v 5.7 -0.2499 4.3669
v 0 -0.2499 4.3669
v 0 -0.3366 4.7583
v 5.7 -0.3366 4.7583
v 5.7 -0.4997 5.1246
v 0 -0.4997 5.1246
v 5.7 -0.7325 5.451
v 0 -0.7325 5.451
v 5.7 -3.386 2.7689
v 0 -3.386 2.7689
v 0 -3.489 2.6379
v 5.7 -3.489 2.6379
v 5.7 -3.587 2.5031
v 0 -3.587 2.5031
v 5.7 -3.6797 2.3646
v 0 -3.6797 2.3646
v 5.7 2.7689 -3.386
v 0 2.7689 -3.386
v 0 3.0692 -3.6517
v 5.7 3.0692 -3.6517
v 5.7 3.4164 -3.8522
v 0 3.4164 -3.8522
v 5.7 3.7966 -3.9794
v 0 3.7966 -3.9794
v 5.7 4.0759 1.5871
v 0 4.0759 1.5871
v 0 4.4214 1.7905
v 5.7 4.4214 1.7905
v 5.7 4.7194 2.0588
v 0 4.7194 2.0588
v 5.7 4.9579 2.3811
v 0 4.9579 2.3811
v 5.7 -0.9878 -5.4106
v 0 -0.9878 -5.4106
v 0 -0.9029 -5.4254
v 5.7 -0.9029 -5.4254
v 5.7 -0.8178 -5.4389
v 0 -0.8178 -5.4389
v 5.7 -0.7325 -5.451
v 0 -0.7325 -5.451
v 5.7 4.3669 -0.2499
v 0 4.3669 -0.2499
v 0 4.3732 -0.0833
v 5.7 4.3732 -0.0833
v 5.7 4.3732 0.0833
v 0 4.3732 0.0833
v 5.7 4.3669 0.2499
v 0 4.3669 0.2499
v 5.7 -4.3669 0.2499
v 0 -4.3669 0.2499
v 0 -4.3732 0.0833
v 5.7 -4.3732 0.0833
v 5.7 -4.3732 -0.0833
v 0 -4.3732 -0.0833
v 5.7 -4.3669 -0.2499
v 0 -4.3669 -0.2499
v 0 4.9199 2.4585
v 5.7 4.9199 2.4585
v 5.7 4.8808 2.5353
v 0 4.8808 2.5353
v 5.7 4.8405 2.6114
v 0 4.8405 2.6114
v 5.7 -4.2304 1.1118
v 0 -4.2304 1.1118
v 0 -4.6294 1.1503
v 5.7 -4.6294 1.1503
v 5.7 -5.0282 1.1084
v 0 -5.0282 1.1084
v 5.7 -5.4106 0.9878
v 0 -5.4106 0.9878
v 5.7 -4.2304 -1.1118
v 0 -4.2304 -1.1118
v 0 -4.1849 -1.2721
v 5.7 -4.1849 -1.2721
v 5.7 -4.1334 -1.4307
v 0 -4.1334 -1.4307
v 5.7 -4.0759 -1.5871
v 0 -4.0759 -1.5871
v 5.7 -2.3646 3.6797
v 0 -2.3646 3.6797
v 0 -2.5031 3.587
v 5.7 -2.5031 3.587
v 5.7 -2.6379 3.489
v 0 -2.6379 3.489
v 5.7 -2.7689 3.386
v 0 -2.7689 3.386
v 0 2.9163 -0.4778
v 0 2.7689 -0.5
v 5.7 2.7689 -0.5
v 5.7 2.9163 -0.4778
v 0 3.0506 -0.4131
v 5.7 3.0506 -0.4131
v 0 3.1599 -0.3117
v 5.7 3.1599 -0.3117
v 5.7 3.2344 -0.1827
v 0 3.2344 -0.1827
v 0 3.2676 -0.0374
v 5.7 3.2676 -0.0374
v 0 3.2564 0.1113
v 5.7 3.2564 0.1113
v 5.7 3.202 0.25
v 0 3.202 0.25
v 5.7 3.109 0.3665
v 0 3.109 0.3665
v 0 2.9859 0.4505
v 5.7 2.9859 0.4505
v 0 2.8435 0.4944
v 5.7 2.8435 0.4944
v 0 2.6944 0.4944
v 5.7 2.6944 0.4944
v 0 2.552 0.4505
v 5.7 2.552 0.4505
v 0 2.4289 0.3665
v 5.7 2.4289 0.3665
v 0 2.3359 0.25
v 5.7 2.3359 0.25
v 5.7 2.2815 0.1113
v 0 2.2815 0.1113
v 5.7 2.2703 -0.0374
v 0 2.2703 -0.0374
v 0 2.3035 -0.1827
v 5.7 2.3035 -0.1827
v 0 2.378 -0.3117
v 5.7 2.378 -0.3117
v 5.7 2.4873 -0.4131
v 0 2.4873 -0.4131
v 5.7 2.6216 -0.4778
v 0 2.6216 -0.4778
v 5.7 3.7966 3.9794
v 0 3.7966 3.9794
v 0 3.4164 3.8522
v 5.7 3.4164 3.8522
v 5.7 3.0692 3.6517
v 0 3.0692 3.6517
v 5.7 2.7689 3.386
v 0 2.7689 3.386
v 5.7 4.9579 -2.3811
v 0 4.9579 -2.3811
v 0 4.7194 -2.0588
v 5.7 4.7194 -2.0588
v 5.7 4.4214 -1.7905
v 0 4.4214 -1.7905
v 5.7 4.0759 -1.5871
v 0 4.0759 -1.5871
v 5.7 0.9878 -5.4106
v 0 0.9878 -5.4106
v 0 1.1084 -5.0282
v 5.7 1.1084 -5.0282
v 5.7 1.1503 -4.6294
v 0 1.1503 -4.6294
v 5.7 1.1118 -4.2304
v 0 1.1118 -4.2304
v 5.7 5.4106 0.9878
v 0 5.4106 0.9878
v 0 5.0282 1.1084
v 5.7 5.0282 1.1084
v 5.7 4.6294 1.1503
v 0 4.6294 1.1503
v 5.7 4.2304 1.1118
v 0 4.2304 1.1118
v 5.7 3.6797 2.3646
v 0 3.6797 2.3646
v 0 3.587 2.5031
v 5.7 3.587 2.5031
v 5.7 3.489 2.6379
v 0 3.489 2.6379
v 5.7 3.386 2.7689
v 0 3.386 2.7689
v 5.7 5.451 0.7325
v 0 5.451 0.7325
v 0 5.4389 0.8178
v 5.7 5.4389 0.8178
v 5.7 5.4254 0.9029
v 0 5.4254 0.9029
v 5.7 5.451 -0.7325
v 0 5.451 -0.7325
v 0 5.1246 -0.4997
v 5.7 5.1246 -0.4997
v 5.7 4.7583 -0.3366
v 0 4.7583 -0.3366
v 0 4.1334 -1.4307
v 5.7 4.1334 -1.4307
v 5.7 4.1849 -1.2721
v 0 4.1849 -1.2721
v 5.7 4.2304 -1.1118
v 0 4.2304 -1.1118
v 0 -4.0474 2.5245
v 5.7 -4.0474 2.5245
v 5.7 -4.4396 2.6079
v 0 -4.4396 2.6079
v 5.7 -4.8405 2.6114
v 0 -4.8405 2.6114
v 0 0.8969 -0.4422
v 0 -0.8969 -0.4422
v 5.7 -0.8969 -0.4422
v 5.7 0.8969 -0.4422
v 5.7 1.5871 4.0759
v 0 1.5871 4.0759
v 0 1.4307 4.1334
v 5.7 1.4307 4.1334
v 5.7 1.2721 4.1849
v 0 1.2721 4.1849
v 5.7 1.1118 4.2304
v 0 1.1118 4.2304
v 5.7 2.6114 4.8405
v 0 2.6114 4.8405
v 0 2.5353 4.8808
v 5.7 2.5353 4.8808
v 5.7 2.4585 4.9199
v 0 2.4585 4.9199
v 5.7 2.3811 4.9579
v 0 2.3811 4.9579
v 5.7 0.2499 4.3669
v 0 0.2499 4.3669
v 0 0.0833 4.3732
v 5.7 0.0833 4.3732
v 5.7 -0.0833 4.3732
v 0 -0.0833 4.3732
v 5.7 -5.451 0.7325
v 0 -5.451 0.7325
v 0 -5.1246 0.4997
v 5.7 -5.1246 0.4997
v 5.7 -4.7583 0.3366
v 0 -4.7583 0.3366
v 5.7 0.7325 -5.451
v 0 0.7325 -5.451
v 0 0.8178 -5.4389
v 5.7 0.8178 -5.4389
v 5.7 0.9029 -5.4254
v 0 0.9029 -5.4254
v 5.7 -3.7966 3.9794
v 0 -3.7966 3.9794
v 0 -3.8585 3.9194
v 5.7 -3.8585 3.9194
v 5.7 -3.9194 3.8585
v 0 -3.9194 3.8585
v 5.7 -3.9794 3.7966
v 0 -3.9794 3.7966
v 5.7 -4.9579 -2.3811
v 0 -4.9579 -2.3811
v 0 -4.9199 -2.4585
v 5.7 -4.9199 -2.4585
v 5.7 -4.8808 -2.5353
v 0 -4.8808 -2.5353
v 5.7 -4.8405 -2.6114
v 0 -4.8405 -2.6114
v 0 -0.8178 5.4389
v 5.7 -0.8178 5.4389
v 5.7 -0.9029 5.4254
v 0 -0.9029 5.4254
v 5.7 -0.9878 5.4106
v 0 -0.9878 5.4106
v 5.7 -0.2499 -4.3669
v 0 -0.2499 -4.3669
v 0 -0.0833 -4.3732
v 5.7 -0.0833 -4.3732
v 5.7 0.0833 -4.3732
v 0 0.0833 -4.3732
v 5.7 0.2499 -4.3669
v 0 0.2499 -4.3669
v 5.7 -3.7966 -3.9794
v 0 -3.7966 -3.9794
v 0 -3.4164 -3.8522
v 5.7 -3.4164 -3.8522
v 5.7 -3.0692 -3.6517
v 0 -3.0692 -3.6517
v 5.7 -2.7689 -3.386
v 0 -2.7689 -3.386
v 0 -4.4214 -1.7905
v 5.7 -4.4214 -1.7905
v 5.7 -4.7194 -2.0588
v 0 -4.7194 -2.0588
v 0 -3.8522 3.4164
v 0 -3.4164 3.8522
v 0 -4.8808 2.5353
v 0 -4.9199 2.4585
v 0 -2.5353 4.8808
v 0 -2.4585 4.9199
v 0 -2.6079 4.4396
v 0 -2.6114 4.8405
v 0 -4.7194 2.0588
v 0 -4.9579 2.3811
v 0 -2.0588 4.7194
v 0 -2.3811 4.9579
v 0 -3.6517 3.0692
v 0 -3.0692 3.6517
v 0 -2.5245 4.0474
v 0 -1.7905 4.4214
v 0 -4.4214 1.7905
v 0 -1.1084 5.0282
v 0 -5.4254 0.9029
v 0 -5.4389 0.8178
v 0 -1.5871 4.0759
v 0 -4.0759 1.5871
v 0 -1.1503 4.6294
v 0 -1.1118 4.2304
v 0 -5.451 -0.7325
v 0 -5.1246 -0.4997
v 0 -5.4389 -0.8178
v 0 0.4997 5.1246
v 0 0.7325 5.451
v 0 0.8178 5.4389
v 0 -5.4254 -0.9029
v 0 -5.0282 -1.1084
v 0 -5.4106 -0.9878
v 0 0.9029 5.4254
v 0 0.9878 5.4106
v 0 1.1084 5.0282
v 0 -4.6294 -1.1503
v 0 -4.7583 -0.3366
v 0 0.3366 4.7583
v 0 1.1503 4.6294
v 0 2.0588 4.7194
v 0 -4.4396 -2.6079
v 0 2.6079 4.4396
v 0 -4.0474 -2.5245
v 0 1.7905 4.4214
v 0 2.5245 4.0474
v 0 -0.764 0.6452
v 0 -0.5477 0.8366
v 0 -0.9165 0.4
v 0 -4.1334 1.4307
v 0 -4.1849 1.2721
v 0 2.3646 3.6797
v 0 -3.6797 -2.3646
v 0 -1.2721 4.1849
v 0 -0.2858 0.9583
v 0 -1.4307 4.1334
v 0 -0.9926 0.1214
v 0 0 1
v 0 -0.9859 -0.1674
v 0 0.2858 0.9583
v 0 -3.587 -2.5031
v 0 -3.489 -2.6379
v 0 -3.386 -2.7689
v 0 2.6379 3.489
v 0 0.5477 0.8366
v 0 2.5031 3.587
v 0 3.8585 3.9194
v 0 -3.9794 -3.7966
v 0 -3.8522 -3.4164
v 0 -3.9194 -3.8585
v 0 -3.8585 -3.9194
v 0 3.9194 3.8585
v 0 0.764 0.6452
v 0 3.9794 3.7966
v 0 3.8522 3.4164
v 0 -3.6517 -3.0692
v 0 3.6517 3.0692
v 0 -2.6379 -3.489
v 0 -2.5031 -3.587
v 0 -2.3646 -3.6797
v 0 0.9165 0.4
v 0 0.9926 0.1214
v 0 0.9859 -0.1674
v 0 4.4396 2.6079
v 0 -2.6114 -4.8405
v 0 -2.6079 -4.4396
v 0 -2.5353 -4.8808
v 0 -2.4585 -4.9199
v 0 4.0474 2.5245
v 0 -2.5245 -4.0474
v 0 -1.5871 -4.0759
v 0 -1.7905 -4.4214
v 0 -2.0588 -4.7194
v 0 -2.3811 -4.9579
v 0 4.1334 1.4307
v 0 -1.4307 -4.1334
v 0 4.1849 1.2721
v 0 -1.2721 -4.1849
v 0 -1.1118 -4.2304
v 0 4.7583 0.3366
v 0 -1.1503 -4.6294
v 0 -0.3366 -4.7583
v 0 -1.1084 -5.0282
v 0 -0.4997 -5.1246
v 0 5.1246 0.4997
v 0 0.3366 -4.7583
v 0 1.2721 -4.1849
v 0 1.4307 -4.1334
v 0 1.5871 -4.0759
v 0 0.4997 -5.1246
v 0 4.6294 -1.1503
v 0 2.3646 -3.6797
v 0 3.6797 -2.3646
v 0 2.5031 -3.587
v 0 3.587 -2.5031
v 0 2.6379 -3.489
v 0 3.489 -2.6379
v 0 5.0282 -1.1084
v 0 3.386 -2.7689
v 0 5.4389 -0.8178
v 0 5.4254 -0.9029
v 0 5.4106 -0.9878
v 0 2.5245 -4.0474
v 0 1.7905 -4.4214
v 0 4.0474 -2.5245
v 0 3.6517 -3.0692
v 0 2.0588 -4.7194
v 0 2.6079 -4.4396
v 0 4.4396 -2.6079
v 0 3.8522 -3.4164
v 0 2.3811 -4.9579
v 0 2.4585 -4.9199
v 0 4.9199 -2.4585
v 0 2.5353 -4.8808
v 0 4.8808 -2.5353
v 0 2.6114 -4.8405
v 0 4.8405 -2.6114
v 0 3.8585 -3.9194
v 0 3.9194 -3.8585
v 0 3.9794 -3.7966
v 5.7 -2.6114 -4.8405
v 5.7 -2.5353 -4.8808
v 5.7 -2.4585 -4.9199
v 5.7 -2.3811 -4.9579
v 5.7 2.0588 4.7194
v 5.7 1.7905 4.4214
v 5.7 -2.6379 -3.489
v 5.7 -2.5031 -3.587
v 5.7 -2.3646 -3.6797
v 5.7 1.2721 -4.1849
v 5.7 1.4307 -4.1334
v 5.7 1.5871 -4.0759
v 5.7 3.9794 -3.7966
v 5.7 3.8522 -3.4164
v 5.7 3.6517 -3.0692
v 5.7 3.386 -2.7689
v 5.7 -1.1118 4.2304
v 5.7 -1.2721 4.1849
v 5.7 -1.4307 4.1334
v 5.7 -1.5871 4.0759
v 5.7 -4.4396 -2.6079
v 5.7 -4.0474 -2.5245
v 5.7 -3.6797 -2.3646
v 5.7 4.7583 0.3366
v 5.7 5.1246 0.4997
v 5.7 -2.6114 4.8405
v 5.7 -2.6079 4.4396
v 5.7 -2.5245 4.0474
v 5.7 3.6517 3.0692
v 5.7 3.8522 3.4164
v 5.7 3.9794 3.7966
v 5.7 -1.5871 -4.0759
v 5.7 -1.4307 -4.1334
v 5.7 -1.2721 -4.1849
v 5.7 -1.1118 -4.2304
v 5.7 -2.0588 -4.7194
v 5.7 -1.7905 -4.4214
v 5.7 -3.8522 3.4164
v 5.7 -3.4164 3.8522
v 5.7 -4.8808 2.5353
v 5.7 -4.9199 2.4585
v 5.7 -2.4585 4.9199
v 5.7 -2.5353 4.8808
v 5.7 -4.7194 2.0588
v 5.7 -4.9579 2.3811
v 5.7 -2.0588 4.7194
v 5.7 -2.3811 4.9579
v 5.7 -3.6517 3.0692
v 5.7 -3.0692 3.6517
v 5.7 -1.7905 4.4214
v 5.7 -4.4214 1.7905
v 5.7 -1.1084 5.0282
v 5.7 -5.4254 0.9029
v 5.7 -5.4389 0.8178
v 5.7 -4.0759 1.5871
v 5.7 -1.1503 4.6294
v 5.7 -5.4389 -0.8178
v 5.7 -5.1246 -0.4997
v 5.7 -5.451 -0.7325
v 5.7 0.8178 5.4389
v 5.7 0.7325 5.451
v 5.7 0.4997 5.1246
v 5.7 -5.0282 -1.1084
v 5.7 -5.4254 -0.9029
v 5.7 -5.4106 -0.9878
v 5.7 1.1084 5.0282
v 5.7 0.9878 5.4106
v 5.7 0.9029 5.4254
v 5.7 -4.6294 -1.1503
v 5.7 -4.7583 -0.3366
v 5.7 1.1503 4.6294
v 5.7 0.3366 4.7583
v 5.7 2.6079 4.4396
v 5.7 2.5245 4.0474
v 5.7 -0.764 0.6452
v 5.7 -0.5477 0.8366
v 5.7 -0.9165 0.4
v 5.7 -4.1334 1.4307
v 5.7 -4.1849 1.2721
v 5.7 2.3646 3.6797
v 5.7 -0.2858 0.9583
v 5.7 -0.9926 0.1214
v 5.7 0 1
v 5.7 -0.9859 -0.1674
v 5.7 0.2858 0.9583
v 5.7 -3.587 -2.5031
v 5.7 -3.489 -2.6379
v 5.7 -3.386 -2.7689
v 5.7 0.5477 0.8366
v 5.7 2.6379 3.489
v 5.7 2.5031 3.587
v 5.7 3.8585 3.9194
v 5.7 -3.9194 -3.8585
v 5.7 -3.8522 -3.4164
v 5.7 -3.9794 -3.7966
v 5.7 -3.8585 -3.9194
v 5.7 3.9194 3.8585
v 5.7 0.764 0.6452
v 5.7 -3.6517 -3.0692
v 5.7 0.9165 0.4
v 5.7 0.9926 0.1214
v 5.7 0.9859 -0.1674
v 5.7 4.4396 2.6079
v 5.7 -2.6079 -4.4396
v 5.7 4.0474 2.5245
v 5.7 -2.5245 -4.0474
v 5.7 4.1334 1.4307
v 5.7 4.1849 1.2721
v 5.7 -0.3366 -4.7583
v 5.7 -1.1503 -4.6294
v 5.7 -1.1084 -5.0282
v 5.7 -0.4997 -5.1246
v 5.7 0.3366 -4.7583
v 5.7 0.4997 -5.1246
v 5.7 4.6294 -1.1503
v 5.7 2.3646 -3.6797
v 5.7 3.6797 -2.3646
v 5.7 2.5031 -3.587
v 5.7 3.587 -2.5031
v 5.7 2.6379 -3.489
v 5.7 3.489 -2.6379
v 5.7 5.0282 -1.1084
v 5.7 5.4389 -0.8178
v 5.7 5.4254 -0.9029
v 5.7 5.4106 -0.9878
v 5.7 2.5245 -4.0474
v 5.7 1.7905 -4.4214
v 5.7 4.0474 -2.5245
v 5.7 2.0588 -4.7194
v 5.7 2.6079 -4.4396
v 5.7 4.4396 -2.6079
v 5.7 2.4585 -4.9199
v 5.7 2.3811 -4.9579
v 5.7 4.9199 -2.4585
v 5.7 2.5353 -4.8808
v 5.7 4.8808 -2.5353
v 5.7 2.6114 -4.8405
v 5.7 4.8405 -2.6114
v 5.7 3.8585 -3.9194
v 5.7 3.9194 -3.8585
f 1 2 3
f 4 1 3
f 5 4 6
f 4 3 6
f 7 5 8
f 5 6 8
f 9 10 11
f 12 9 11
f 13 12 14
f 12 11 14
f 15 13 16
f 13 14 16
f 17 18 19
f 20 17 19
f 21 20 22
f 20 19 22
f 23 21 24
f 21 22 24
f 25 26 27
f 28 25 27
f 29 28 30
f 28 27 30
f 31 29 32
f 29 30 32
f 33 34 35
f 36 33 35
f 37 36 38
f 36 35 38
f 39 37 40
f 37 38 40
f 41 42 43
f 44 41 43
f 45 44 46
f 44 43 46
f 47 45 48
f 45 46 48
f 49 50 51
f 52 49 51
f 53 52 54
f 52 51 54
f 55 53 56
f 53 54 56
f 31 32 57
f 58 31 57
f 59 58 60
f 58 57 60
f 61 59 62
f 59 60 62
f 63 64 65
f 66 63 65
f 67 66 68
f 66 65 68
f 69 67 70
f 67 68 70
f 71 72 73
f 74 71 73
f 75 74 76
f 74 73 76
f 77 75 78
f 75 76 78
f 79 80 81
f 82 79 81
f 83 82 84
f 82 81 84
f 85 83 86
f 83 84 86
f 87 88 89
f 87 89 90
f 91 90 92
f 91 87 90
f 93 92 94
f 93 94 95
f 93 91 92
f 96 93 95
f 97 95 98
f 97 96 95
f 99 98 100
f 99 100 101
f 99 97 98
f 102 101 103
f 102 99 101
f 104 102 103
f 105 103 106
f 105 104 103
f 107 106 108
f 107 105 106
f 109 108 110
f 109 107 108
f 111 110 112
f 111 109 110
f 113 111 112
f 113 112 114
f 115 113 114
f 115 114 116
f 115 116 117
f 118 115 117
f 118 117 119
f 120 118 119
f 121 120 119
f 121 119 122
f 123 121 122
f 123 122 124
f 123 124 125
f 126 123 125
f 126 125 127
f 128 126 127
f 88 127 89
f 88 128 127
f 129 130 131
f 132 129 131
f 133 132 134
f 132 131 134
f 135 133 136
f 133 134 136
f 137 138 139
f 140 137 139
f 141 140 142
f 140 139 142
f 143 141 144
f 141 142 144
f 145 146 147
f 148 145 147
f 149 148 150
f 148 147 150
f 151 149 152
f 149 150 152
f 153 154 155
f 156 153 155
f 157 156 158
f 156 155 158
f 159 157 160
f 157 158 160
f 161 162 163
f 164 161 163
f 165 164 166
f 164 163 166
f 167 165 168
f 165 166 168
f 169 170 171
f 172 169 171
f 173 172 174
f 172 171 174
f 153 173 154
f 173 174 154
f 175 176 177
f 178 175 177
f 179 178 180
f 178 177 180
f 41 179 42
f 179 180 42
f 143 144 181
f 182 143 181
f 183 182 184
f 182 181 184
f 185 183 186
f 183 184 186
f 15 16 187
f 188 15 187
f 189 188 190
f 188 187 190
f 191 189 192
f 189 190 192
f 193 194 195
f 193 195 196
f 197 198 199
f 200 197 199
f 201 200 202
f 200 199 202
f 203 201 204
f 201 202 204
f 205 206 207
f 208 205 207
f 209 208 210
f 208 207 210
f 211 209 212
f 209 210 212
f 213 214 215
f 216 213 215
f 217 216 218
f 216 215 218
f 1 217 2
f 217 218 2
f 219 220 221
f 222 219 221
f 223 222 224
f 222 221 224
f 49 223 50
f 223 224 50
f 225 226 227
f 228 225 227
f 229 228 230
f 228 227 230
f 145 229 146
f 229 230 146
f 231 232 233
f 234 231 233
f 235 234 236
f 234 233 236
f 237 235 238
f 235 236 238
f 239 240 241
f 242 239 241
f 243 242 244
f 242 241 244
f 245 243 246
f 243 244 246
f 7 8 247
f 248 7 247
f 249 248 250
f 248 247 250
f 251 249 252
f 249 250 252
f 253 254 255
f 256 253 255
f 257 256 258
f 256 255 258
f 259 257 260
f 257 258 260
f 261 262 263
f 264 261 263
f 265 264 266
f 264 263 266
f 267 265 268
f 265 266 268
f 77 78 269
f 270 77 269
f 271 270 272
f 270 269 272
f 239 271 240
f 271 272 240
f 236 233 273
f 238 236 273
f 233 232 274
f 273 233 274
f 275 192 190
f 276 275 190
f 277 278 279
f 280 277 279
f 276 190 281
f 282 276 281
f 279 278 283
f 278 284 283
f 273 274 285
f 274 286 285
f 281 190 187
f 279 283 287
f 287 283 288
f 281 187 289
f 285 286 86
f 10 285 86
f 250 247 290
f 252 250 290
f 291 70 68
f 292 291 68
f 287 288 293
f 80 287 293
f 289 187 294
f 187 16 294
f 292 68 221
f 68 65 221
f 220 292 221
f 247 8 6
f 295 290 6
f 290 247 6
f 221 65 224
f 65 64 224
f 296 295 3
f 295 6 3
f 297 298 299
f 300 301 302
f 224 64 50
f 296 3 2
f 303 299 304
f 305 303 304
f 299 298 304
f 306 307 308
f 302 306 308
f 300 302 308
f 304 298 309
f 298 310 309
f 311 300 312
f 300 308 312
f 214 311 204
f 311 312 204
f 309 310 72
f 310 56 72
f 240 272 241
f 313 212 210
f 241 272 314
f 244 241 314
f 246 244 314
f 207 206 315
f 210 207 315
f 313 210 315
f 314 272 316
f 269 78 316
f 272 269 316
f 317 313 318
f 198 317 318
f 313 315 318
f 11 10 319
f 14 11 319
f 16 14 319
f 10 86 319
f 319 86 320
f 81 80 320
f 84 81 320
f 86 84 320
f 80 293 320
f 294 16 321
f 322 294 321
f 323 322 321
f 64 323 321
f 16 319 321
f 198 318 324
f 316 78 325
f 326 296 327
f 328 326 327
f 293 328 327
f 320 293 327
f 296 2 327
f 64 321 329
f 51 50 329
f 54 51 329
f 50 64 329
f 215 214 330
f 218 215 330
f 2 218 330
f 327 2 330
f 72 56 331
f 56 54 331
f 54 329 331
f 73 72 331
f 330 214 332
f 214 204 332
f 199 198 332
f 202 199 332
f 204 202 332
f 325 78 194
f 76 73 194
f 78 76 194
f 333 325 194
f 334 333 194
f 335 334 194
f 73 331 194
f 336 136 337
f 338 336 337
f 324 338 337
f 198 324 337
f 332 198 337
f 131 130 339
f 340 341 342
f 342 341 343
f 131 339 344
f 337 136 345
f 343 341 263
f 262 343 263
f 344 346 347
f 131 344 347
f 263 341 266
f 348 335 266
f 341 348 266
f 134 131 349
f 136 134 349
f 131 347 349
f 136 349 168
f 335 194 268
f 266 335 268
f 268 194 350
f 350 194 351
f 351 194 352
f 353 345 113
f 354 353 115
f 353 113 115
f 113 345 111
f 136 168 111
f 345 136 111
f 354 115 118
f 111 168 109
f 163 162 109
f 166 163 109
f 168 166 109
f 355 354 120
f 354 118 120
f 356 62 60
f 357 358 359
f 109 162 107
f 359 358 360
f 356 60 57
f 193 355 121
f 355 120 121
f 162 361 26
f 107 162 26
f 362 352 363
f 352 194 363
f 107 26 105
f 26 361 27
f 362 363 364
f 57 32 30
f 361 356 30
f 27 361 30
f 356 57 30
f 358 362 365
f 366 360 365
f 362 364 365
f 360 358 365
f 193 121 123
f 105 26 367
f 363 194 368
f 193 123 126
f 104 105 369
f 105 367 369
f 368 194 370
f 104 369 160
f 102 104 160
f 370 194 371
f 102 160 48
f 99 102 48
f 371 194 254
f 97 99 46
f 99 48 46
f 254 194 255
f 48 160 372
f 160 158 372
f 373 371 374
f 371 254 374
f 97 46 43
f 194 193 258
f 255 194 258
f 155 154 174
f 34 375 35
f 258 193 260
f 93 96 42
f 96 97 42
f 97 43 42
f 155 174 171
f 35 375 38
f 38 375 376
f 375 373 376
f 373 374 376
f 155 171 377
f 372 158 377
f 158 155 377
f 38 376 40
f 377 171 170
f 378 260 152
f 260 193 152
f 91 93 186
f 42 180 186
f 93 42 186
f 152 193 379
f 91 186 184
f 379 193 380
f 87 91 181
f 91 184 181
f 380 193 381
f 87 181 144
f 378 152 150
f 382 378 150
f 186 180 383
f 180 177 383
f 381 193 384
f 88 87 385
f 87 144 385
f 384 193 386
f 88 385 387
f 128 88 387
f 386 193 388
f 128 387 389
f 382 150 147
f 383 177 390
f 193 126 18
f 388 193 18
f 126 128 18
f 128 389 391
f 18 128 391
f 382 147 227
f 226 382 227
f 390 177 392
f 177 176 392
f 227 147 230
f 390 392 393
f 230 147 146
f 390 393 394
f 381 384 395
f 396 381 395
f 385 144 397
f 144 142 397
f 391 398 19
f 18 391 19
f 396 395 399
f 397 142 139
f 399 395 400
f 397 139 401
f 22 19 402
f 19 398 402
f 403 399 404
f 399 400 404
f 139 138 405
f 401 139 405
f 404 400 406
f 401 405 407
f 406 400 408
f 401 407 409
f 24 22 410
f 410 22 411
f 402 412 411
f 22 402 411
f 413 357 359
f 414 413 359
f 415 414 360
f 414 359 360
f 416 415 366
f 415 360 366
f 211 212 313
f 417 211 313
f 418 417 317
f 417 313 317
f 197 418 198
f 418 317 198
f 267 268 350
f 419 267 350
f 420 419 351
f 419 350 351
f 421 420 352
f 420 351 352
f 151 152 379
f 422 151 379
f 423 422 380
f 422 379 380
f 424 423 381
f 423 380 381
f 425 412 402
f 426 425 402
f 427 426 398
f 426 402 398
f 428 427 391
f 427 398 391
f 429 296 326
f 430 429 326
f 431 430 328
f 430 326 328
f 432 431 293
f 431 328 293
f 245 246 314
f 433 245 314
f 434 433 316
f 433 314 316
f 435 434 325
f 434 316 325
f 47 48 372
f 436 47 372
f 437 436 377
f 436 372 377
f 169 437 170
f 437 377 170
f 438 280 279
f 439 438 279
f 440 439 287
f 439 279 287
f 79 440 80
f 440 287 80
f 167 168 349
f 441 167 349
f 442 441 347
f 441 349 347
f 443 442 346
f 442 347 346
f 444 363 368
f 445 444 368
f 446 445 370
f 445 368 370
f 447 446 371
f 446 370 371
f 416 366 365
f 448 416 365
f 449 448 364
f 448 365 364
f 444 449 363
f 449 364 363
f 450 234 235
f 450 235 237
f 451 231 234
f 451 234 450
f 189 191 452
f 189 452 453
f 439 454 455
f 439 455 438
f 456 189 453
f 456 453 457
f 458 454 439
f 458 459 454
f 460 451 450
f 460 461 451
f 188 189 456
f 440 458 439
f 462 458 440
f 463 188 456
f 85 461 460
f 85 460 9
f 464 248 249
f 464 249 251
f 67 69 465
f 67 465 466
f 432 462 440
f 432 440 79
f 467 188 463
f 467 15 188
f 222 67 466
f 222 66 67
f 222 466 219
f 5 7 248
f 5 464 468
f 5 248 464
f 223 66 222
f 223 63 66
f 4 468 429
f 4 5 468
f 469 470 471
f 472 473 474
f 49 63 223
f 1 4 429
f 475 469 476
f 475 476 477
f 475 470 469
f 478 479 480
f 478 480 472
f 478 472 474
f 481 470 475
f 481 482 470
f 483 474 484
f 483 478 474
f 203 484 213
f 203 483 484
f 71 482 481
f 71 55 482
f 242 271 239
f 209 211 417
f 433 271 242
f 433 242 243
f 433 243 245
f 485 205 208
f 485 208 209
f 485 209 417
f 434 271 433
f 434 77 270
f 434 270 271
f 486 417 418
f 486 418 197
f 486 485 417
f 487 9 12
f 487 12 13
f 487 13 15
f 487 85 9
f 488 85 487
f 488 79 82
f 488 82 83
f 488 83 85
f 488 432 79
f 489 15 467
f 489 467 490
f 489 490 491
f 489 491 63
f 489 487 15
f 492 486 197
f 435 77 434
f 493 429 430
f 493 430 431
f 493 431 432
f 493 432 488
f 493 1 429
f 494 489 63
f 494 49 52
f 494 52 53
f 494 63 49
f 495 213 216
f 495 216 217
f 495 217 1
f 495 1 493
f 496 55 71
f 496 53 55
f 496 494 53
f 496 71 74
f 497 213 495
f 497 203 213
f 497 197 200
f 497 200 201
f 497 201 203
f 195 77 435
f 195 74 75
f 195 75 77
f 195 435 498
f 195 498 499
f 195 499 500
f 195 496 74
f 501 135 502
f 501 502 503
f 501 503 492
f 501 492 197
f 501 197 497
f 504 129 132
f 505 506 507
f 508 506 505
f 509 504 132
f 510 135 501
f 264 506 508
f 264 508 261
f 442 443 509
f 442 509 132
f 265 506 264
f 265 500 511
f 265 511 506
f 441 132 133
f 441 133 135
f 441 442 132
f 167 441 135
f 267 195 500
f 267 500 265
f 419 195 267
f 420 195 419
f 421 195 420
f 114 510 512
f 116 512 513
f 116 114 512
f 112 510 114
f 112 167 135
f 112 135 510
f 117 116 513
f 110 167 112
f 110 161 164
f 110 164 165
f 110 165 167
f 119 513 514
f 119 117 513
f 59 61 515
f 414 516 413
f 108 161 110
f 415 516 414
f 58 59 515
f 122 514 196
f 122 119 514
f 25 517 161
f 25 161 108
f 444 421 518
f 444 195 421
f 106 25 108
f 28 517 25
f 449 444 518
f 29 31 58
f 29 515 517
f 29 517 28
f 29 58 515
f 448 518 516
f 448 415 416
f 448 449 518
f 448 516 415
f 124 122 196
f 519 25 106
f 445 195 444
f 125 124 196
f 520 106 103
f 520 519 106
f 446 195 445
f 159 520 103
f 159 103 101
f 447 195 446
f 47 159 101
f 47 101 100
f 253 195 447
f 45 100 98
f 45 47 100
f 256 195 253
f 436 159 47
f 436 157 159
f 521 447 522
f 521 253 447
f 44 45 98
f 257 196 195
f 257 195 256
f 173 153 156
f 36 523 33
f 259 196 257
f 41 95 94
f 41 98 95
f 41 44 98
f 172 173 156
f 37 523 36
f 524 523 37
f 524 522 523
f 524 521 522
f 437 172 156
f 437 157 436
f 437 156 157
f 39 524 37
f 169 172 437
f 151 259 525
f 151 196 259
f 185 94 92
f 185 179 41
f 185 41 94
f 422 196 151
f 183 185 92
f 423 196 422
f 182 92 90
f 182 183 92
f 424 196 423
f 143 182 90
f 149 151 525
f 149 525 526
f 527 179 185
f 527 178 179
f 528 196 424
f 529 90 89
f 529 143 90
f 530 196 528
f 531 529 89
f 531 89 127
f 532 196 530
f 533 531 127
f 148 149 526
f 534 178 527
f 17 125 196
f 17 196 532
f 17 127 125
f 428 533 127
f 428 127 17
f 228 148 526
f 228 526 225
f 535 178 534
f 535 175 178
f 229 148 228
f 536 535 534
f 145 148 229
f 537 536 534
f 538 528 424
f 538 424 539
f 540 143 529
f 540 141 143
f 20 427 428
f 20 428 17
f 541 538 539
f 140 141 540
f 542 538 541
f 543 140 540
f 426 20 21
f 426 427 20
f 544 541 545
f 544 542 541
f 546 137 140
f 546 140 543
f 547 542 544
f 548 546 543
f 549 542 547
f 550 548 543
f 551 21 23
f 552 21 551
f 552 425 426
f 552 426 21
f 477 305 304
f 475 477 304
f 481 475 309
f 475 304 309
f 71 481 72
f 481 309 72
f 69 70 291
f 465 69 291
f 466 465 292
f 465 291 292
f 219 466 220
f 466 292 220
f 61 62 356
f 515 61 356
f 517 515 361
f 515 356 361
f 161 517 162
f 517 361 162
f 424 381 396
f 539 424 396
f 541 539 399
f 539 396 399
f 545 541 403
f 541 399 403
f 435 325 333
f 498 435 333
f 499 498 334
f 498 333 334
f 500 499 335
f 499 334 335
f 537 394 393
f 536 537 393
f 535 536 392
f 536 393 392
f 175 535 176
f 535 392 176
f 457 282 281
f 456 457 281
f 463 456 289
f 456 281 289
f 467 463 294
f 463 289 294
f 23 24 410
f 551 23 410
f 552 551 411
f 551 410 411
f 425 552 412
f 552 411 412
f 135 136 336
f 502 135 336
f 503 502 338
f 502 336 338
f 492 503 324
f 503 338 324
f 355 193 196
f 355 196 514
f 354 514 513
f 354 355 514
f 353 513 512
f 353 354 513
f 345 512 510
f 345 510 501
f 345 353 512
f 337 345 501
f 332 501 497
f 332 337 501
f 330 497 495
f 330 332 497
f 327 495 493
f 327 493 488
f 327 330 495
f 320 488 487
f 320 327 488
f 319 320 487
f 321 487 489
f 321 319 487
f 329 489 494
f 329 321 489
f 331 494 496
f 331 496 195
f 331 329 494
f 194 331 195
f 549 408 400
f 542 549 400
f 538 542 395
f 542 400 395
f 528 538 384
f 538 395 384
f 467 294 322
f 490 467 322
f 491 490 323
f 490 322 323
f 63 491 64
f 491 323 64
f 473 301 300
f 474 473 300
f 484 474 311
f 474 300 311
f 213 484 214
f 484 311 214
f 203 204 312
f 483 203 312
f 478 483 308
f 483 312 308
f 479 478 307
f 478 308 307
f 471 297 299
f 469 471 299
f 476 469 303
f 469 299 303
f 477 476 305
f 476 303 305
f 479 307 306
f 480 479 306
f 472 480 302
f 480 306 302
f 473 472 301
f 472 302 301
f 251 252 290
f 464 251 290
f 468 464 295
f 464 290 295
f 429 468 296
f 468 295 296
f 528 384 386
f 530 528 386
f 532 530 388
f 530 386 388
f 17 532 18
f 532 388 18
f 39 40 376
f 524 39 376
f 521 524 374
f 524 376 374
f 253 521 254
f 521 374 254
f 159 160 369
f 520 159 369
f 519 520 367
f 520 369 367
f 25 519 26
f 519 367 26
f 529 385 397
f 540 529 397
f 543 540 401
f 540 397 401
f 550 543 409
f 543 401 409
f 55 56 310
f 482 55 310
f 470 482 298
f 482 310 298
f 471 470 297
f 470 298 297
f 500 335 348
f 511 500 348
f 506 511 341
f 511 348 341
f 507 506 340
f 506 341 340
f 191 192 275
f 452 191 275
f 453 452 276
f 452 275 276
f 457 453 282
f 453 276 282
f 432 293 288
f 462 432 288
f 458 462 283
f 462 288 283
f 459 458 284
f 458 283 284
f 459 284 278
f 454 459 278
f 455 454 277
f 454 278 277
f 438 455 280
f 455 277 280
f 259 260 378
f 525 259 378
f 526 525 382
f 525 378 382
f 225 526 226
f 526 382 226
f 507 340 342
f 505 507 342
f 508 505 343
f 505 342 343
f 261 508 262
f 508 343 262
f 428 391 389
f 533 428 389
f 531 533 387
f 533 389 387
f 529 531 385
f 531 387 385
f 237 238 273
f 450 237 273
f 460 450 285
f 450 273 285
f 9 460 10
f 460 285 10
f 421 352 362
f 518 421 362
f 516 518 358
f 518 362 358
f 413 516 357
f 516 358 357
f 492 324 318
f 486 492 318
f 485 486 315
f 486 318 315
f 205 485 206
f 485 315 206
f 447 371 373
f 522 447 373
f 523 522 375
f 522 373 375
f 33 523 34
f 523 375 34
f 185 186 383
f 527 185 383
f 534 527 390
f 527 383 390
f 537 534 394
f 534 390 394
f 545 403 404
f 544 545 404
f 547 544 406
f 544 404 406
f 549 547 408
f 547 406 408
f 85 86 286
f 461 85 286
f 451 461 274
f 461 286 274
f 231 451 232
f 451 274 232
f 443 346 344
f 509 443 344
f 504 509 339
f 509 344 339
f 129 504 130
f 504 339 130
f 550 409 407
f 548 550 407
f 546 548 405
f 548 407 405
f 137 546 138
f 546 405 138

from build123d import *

# Parameters (mm, degrees)
SKETCH_7_R      = 0.5
EXTRUDE_3_DEPTH = 5.7


with BuildPart() as part:
    # 草图7 → 凸台-拉伸3 (new body)
    with BuildSketch(Plane(origin=(0, 0, 0), x_dir=(0, 0, -1), z_dir=(1, 0, 0))):
        with BuildLine():
            ThreePointArc((-5.451006848, 0.732478218), (-4.945547363, 0.408928549), (-4.366855207, 0.249903181))
            ThreePointArc((-4.366855207, 0.249903181), (-4.374, 0), (-4.366855207, -0.249903181))
            ThreePointArc((-4.366855207, -0.249903181), (-4.945547363, -0.408928549), (-5.451006848, -0.732478218))
            ThreePointArc((-5.451006848, -0.732478218), (-5.432285873, -0.860389558), (-5.410563801, -0.987825571))
            ThreePointArc((-5.410563801, -0.987825571), (-4.829860918, -1.139344021), (-4.23035043, -1.111760422))
            ThreePointArc((-4.23035043, -1.111760422), (-4.159921202, -1.351640333), (-4.075901771, -1.58710452))
            ThreePointArc((-4.075901771, -1.58710452), (-4.577129176, -1.917172343), (-4.957867366, -2.381081934))
            ThreePointArc((-4.957867366, -2.381081934), (-4.900535883, -2.496947749), (-4.840497071, -2.61143411))
            ThreePointArc((-4.840497071, -2.61143411), (-4.241394034, -2.576089659), (-3.679749479, -2.364597169))
            ThreePointArc((-3.679749479, -2.364597169), (-3.538640333, -2.570972694), (-3.38597067, -2.76894901))
            ThreePointArc((-3.38597067, -2.76894901), (-3.760669693, -3.23774995), (-3.979417283, -3.796608762))
            ThreePointArc((-3.979417283, -3.796608762), (-3.889087297, -3.889087297), (-3.796608762, -3.979417283))
            ThreePointArc((-3.796608762, -3.979417283), (-3.23774995, -3.760669693), (-2.76894901, -3.38597067))
            ThreePointArc((-2.76894901, -3.38597067), (-2.570972694, -3.538640333), (-2.364597169, -3.679749479))
            ThreePointArc((-2.364597169, -3.679749479), (-2.576089659, -4.241394034), (-2.61143411, -4.840497071))
            ThreePointArc((-2.61143411, -4.840497071), (-2.496947749, -4.900535883), (-2.381081934, -4.957867366))
            ThreePointArc((-2.381081934, -4.957867366), (-1.917172343, -4.577129176), (-1.58710452, -4.075901771))
            ThreePointArc((-1.58710452, -4.075901771), (-1.351640333, -4.159921202), (-1.111760422, -4.23035043))
            ThreePointArc((-1.111760422, -4.23035043), (-1.139344021, -4.829860918), (-0.987825571, -5.410563801))
            ThreePointArc((-0.987825571, -5.410563801), (-0.860389558, -5.432285873), (-0.732478218, -5.451006848))
            ThreePointArc((-0.732478218, -5.451006848), (-0.408928549, -4.945547363), (-0.249903181, -4.366855207))
            ThreePointArc((-0.249903181, -4.366855207), (0, -4.374), (0.249903181, -4.366855207))
            ThreePointArc((0.249903181, -4.366855207), (0.408928549, -4.945547363), (0.732478218, -5.451006848))
            ThreePointArc((0.732478218, -5.451006848), (0.860389558, -5.432285873), (0.987825571, -5.410563801))
            ThreePointArc((0.987825571, -5.410563801), (1.139344021, -4.829860918), (1.111760422, -4.23035043))
            ThreePointArc((1.111760422, -4.23035043), (1.351640333, -4.159921202), (1.58710452, -4.075901771))
            ThreePointArc((1.58710452, -4.075901771), (1.917172343, -4.577129176), (2.381081934, -4.957867366))
            ThreePointArc((2.381081934, -4.957867366), (2.496947749, -4.900535883), (2.61143411, -4.840497071))
            ThreePointArc((2.61143411, -4.840497071), (2.576089659, -4.241394034), (2.364597169, -3.679749479))
            ThreePointArc((2.364597169, -3.679749479), (2.570972694, -3.538640333), (2.76894901, -3.38597067))
            ThreePointArc((2.76894901, -3.38597067), (3.23774995, -3.760669693), (3.796608762, -3.979417283))
            ThreePointArc((3.796608762, -3.979417283), (3.889087297, -3.889087297), (3.979417283, -3.796608762))
            ThreePointArc((3.979417283, -3.796608762), (3.760669693, -3.23774995), (3.38597067, -2.76894901))
            ThreePointArc((3.38597067, -2.76894901), (3.538640333, -2.570972694), (3.679749479, -2.364597169))
            ThreePointArc((3.679749479, -2.364597169), (4.241394034, -2.576089659), (4.840497071, -2.61143411))
            ThreePointArc((4.840497071, -2.61143411), (4.900535883, -2.496947749), (4.957867366, -2.381081934))
            ThreePointArc((4.957867366, -2.381081934), (4.577129176, -1.917172343), (4.075901771, -1.58710452))
            ThreePointArc((4.075901771, -1.58710452), (4.159921202, -1.351640333), (4.23035043, -1.111760422))
            ThreePointArc((4.23035043, -1.111760422), (4.829860918, -1.139344021), (5.410563801, -0.987825571))
            ThreePointArc((5.410563801, -0.987825571), (5.432285873, -0.860389558), (5.451006848, -0.732478218))
            ThreePointArc((5.451006848, -0.732478218), (4.945547363, -0.408928549), (4.366855207, -0.249903181))
            ThreePointArc((4.366855207, -0.249903181), (4.374, 0), (4.366855207, 0.249903181))
            ThreePointArc((4.366855207, 0.249903181), (4.945547363, 0.408928549), (5.451006848, 0.732478218))
            ThreePointArc((5.451006848, 0.732478218), (5.432285873, 0.860389558), (5.410563801, 0.987825571))
            ThreePointArc((5.410563801, 0.987825571), (4.829860918, 1.139344021), (4.23035043, 1.111760422))
            ThreePointArc((4.23035043, 1.111760422), (4.159921202, 1.351640333), (4.075901771, 1.58710452))
            ThreePointArc((4.075901771, 1.58710452), (4.577129176, 1.917172343), (4.957867366, 2.381081934))
            ThreePointArc((4.957867366, 2.381081934), (4.900535883, 2.496947749), (4.840497071, 2.61143411))
            ThreePointArc((4.840497071, 2.61143411), (4.241394034, 2.576089659), (3.679749479, 2.364597169))
            ThreePointArc((3.679749479, 2.364597169), (3.538640333, 2.570972694), (3.38597067, 2.76894901))
            ThreePointArc((3.38597067, 2.76894901), (3.760669693, 3.23774995), (3.979417283, 3.796608762))
            ThreePointArc((3.979417283, 3.796608762), (3.889087297, 3.889087297), (3.796608762, 3.979417283))
            ThreePointArc((3.796608762, 3.979417283), (3.23774995, 3.760669693), (2.76894901, 3.38597067))
            ThreePointArc((2.76894901, 3.38597067), (2.570972694, 3.538640333), (2.364597169, 3.679749479))
            ThreePointArc((2.364597169, 3.679749479), (2.576089659, 4.241394034), (2.61143411, 4.840497071))
            ThreePointArc((2.61143411, 4.840497071), (2.496947749, 4.900535883), (2.381081934, 4.957867366))
            ThreePointArc((2.381081934, 4.957867366), (1.917172343, 4.577129176), (1.58710452, 4.075901771))
            ThreePointArc((1.58710452, 4.075901771), (1.351640333, 4.159921202), (1.111760422, 4.23035043))
            ThreePointArc((1.111760422, 4.23035043), (1.139344021, 4.829860918), (0.987825571, 5.410563801))
            ThreePointArc((0.987825571, 5.410563801), (0.860389558, 5.432285873), (0.732478218, 5.451006848))
            ThreePointArc((0.732478218, 5.451006848), (0.408928549, 4.945547363), (0.249903181, 4.366855207))
            ThreePointArc((0.249903181, 4.366855207), (0, 4.374), (-0.249903181, 4.366855207))
            ThreePointArc((-0.249903181, 4.366855207), (-0.408928549, 4.945547363), (-0.732478218, 5.451006848))
            ThreePointArc((-0.732478218, 5.451006848), (-0.860389558, 5.432285873), (-0.987825571, 5.410563801))
            ThreePointArc((-0.987825571, 5.410563801), (-1.139344021, 4.829860918), (-1.111760422, 4.23035043))
            ThreePointArc((-1.111760422, 4.23035043), (-1.351640333, 4.159921202), (-1.58710452, 4.075901771))
            ThreePointArc((-1.58710452, 4.075901771), (-1.917172343, 4.577129176), (-2.381081934, 4.957867366))
            ThreePointArc((-2.381081934, 4.957867366), (-2.496947749, 4.900535883), (-2.61143411, 4.840497071))
            ThreePointArc((-2.61143411, 4.840497071), (-2.576089659, 4.241394034), (-2.364597169, 3.679749479))
            ThreePointArc((-2.364597169, 3.679749479), (-2.570972694, 3.538640333), (-2.76894901, 3.38597067))
            ThreePointArc((-2.76894901, 3.38597067), (-3.23774995, 3.760669693), (-3.796608762, 3.979417283))
            ThreePointArc((-3.796608762, 3.979417283), (-3.889087297, 3.889087297), (-3.979417283, 3.796608762))
            ThreePointArc((-3.979417283, 3.796608762), (-3.760669693, 3.23774995), (-3.38597067, 2.76894901))
            ThreePointArc((-3.38597067, 2.76894901), (-3.538640333, 2.570972694), (-3.679749479, 2.364597169))
            ThreePointArc((-3.679749479, 2.364597169), (-4.241394034, 2.576089659), (-4.840497071, 2.61143411))
            ThreePointArc((-4.840497071, 2.61143411), (-4.900535883, 2.496947749), (-4.957867366, 2.381081934))
            ThreePointArc((-4.957867366, 2.381081934), (-4.577129176, 1.917172343), (-4.075901771, 1.58710452))
            ThreePointArc((-4.075901771, 1.58710452), (-4.159921202, 1.351640333), (-4.23035043, 1.111760422))
            ThreePointArc((-4.23035043, 1.111760422), (-4.829860918, 1.139344021), (-5.410563801, 0.987825571))
            ThreePointArc((-5.410563801, 0.987825571), (-5.432285873, 0.860389558), (-5.451006848, 0.732478218))
        make_face()
        with Locations((0, 2.76894901)):
            Circle(SKETCH_7_R, mode=Mode.SUBTRACT)
        with BuildLine():
            Line((0.442162115, -0.896935151), (0.442162115, 0.896935151))
            ThreePointArc((0.442162115, 0.896935151), (-1, 0), (0.442162115, -0.896935151))
        make_face(mode=Mode.SUBTRACT)
    extrude(amount=EXTRUDE_3_DEPTH)


solid = part.part
